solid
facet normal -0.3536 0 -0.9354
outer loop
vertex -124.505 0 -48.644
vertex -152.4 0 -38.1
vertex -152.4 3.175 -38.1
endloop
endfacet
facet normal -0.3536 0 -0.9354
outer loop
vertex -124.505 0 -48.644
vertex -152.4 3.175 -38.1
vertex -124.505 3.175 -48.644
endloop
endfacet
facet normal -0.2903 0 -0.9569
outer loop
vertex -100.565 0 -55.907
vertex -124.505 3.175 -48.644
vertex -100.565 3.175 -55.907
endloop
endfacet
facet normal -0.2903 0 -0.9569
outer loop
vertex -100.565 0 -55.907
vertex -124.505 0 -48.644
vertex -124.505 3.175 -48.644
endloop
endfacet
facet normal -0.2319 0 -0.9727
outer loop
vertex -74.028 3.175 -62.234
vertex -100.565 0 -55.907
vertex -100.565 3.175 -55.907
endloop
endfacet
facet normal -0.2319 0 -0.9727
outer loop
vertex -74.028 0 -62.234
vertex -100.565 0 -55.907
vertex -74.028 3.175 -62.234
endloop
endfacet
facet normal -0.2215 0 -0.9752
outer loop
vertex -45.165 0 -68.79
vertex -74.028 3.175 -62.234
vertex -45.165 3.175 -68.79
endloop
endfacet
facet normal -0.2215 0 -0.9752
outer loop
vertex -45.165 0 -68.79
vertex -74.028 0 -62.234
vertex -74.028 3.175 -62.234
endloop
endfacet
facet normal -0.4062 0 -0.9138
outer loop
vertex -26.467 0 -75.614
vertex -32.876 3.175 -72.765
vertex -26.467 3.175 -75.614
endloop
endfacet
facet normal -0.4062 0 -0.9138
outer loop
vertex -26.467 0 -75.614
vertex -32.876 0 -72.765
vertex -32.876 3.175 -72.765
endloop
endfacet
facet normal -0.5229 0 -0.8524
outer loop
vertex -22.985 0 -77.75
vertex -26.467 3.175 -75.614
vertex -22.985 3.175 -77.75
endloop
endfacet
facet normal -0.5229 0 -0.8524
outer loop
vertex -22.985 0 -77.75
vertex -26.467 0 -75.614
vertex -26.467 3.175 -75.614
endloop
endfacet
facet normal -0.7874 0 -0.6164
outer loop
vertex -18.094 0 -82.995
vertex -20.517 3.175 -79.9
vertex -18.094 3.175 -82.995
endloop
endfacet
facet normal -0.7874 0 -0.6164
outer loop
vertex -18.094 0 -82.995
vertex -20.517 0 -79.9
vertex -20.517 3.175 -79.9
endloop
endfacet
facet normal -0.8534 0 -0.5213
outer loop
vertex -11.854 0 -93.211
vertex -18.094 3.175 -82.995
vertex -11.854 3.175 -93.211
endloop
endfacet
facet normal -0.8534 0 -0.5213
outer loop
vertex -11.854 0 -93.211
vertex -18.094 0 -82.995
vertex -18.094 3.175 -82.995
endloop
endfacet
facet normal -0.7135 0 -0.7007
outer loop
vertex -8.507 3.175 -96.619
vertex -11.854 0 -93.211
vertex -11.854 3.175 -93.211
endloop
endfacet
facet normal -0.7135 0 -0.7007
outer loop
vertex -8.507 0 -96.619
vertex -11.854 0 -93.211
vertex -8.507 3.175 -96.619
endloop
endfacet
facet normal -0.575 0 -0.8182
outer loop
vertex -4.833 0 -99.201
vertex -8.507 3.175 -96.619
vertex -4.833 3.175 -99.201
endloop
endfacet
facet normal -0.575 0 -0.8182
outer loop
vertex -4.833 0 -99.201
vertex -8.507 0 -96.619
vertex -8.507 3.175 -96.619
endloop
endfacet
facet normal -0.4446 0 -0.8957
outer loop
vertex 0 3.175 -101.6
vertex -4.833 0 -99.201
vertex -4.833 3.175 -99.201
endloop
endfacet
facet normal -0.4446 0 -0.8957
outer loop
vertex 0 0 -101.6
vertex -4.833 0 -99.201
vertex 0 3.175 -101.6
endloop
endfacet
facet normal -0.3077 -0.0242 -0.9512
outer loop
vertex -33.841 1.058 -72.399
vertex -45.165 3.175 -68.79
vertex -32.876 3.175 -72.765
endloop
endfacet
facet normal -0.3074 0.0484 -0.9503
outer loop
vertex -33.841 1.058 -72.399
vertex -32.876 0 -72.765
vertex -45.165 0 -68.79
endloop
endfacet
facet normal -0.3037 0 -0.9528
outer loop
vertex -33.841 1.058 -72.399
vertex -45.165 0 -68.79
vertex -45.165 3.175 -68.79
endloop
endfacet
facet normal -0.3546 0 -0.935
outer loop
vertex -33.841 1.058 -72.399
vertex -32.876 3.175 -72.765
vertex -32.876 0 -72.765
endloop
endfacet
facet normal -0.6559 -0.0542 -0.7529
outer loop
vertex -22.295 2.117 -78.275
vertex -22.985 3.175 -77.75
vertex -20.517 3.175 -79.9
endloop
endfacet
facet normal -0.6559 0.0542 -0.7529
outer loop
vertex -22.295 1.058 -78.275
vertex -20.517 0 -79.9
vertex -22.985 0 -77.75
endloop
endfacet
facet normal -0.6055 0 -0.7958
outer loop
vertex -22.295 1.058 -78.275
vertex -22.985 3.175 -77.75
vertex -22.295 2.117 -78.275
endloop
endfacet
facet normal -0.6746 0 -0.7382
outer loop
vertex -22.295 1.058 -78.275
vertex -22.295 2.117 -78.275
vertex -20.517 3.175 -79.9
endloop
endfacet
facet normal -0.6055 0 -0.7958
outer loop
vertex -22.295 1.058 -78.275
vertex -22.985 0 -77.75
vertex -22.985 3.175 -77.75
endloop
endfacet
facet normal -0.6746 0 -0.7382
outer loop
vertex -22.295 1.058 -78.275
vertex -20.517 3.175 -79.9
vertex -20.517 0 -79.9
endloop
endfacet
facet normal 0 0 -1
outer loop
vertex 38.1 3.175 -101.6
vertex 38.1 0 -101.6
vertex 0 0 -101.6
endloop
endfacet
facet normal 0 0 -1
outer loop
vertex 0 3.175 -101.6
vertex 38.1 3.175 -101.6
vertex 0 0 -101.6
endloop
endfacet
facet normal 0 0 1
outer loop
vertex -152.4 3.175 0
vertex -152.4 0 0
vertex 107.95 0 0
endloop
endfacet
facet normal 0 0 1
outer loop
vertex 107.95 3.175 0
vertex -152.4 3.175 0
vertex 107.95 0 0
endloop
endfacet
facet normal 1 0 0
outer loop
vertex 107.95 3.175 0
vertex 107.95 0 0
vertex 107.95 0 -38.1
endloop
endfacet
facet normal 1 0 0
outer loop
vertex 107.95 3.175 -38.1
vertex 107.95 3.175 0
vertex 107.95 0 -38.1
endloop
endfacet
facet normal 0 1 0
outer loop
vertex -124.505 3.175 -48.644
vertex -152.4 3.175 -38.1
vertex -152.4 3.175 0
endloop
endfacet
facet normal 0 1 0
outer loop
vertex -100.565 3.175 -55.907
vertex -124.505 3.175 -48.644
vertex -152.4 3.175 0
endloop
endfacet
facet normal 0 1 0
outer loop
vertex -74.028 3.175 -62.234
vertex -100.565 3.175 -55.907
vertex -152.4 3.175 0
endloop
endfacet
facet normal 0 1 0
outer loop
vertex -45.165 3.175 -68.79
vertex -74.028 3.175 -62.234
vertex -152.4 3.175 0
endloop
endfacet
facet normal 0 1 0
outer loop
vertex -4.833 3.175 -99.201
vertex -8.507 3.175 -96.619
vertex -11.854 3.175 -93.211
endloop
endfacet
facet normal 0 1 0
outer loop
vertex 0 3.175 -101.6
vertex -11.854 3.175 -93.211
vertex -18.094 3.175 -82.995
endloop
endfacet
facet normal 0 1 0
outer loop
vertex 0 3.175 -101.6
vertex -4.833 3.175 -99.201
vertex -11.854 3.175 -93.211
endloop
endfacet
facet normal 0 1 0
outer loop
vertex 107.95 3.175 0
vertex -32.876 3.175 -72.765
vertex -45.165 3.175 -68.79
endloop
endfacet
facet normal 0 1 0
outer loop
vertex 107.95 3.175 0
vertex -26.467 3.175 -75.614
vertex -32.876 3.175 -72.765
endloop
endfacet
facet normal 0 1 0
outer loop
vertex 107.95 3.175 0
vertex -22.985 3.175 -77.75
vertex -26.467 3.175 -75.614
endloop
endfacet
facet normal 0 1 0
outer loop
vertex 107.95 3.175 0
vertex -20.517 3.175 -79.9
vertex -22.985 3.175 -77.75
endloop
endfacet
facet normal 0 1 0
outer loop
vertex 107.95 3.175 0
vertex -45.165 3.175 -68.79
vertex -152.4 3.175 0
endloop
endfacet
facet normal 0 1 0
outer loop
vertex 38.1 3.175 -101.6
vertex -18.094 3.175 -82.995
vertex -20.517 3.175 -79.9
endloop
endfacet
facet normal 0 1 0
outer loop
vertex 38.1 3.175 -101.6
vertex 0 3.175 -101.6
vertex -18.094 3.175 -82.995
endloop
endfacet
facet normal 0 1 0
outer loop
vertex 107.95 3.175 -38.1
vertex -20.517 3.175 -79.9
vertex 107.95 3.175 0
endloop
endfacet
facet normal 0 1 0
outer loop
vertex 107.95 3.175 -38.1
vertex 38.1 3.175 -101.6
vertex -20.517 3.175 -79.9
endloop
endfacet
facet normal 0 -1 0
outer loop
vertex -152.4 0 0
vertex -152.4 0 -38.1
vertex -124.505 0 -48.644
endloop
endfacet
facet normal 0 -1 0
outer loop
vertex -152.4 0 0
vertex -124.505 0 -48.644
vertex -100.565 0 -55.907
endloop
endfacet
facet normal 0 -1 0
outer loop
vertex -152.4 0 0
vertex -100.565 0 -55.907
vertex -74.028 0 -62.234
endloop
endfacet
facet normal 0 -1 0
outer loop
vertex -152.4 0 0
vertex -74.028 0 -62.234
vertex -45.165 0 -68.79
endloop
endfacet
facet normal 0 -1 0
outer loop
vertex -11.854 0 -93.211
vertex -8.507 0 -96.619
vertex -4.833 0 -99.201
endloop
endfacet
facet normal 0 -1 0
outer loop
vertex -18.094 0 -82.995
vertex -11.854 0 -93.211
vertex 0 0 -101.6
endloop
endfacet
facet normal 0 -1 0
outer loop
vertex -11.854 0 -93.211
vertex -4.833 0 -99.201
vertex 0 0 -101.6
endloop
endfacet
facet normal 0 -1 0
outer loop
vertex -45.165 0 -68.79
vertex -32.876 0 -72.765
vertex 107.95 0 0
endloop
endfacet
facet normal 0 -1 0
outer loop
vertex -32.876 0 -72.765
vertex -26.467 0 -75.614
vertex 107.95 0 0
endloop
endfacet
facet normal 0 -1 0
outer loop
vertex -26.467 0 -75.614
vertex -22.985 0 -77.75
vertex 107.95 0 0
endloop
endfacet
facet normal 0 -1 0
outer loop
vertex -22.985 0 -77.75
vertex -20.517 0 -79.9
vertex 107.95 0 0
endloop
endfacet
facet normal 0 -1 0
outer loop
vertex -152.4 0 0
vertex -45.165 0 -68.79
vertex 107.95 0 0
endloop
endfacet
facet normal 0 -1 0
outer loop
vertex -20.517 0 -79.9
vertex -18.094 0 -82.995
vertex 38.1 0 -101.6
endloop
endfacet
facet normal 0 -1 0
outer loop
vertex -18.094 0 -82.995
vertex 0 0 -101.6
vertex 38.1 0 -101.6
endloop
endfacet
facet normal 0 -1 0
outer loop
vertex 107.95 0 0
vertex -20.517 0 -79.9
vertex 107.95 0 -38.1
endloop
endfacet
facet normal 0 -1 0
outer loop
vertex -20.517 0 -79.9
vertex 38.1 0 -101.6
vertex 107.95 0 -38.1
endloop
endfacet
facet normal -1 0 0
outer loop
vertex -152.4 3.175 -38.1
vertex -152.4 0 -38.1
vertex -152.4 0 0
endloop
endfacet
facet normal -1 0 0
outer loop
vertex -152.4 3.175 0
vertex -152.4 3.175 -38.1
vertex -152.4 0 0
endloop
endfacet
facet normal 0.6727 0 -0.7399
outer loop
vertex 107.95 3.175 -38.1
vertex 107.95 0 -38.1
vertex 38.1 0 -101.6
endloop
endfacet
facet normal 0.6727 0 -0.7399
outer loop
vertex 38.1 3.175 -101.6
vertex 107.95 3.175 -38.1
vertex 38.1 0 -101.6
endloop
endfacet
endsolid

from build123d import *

# Parameters (mm, degrees)
BOSS_EXTRUDE1_DEPTH = 3.175


with BuildPart() as part:
    # Sketch1 → Boss-Extrude1 (new body)
    with BuildSketch(Plane(origin=(0, 0, 0), x_dir=(1, 0, 0), z_dir=(0, 1, 0))):
        with BuildLine():
            Line((-152.4, 0), (107.95, 0))
            Line((107.95, 0), (107.95, 38.1))
            Line((107.95, 38.1), (38.1, 101.6))
            Line((38.1, 101.6), (0, 101.6))
            add(Edge.make_bspline(
                [(-152.4, 38.1), (-93.526008547, 62.630829772), (-55.632677833, 62.244474427), (-13.235249882, 81.341283437), (-16.312722453, 94.803032311), (0, 101.6)],
                knots=[0, 0, 0, 0, 0.617418124, 0.717418124, 1, 1, 1, 1], degree=3))
            Line((-152.4, 38.1), (-152.4, 0))
        make_face()
    extrude(amount=BOSS_EXTRUDE1_DEPTH)


solid = part.part
